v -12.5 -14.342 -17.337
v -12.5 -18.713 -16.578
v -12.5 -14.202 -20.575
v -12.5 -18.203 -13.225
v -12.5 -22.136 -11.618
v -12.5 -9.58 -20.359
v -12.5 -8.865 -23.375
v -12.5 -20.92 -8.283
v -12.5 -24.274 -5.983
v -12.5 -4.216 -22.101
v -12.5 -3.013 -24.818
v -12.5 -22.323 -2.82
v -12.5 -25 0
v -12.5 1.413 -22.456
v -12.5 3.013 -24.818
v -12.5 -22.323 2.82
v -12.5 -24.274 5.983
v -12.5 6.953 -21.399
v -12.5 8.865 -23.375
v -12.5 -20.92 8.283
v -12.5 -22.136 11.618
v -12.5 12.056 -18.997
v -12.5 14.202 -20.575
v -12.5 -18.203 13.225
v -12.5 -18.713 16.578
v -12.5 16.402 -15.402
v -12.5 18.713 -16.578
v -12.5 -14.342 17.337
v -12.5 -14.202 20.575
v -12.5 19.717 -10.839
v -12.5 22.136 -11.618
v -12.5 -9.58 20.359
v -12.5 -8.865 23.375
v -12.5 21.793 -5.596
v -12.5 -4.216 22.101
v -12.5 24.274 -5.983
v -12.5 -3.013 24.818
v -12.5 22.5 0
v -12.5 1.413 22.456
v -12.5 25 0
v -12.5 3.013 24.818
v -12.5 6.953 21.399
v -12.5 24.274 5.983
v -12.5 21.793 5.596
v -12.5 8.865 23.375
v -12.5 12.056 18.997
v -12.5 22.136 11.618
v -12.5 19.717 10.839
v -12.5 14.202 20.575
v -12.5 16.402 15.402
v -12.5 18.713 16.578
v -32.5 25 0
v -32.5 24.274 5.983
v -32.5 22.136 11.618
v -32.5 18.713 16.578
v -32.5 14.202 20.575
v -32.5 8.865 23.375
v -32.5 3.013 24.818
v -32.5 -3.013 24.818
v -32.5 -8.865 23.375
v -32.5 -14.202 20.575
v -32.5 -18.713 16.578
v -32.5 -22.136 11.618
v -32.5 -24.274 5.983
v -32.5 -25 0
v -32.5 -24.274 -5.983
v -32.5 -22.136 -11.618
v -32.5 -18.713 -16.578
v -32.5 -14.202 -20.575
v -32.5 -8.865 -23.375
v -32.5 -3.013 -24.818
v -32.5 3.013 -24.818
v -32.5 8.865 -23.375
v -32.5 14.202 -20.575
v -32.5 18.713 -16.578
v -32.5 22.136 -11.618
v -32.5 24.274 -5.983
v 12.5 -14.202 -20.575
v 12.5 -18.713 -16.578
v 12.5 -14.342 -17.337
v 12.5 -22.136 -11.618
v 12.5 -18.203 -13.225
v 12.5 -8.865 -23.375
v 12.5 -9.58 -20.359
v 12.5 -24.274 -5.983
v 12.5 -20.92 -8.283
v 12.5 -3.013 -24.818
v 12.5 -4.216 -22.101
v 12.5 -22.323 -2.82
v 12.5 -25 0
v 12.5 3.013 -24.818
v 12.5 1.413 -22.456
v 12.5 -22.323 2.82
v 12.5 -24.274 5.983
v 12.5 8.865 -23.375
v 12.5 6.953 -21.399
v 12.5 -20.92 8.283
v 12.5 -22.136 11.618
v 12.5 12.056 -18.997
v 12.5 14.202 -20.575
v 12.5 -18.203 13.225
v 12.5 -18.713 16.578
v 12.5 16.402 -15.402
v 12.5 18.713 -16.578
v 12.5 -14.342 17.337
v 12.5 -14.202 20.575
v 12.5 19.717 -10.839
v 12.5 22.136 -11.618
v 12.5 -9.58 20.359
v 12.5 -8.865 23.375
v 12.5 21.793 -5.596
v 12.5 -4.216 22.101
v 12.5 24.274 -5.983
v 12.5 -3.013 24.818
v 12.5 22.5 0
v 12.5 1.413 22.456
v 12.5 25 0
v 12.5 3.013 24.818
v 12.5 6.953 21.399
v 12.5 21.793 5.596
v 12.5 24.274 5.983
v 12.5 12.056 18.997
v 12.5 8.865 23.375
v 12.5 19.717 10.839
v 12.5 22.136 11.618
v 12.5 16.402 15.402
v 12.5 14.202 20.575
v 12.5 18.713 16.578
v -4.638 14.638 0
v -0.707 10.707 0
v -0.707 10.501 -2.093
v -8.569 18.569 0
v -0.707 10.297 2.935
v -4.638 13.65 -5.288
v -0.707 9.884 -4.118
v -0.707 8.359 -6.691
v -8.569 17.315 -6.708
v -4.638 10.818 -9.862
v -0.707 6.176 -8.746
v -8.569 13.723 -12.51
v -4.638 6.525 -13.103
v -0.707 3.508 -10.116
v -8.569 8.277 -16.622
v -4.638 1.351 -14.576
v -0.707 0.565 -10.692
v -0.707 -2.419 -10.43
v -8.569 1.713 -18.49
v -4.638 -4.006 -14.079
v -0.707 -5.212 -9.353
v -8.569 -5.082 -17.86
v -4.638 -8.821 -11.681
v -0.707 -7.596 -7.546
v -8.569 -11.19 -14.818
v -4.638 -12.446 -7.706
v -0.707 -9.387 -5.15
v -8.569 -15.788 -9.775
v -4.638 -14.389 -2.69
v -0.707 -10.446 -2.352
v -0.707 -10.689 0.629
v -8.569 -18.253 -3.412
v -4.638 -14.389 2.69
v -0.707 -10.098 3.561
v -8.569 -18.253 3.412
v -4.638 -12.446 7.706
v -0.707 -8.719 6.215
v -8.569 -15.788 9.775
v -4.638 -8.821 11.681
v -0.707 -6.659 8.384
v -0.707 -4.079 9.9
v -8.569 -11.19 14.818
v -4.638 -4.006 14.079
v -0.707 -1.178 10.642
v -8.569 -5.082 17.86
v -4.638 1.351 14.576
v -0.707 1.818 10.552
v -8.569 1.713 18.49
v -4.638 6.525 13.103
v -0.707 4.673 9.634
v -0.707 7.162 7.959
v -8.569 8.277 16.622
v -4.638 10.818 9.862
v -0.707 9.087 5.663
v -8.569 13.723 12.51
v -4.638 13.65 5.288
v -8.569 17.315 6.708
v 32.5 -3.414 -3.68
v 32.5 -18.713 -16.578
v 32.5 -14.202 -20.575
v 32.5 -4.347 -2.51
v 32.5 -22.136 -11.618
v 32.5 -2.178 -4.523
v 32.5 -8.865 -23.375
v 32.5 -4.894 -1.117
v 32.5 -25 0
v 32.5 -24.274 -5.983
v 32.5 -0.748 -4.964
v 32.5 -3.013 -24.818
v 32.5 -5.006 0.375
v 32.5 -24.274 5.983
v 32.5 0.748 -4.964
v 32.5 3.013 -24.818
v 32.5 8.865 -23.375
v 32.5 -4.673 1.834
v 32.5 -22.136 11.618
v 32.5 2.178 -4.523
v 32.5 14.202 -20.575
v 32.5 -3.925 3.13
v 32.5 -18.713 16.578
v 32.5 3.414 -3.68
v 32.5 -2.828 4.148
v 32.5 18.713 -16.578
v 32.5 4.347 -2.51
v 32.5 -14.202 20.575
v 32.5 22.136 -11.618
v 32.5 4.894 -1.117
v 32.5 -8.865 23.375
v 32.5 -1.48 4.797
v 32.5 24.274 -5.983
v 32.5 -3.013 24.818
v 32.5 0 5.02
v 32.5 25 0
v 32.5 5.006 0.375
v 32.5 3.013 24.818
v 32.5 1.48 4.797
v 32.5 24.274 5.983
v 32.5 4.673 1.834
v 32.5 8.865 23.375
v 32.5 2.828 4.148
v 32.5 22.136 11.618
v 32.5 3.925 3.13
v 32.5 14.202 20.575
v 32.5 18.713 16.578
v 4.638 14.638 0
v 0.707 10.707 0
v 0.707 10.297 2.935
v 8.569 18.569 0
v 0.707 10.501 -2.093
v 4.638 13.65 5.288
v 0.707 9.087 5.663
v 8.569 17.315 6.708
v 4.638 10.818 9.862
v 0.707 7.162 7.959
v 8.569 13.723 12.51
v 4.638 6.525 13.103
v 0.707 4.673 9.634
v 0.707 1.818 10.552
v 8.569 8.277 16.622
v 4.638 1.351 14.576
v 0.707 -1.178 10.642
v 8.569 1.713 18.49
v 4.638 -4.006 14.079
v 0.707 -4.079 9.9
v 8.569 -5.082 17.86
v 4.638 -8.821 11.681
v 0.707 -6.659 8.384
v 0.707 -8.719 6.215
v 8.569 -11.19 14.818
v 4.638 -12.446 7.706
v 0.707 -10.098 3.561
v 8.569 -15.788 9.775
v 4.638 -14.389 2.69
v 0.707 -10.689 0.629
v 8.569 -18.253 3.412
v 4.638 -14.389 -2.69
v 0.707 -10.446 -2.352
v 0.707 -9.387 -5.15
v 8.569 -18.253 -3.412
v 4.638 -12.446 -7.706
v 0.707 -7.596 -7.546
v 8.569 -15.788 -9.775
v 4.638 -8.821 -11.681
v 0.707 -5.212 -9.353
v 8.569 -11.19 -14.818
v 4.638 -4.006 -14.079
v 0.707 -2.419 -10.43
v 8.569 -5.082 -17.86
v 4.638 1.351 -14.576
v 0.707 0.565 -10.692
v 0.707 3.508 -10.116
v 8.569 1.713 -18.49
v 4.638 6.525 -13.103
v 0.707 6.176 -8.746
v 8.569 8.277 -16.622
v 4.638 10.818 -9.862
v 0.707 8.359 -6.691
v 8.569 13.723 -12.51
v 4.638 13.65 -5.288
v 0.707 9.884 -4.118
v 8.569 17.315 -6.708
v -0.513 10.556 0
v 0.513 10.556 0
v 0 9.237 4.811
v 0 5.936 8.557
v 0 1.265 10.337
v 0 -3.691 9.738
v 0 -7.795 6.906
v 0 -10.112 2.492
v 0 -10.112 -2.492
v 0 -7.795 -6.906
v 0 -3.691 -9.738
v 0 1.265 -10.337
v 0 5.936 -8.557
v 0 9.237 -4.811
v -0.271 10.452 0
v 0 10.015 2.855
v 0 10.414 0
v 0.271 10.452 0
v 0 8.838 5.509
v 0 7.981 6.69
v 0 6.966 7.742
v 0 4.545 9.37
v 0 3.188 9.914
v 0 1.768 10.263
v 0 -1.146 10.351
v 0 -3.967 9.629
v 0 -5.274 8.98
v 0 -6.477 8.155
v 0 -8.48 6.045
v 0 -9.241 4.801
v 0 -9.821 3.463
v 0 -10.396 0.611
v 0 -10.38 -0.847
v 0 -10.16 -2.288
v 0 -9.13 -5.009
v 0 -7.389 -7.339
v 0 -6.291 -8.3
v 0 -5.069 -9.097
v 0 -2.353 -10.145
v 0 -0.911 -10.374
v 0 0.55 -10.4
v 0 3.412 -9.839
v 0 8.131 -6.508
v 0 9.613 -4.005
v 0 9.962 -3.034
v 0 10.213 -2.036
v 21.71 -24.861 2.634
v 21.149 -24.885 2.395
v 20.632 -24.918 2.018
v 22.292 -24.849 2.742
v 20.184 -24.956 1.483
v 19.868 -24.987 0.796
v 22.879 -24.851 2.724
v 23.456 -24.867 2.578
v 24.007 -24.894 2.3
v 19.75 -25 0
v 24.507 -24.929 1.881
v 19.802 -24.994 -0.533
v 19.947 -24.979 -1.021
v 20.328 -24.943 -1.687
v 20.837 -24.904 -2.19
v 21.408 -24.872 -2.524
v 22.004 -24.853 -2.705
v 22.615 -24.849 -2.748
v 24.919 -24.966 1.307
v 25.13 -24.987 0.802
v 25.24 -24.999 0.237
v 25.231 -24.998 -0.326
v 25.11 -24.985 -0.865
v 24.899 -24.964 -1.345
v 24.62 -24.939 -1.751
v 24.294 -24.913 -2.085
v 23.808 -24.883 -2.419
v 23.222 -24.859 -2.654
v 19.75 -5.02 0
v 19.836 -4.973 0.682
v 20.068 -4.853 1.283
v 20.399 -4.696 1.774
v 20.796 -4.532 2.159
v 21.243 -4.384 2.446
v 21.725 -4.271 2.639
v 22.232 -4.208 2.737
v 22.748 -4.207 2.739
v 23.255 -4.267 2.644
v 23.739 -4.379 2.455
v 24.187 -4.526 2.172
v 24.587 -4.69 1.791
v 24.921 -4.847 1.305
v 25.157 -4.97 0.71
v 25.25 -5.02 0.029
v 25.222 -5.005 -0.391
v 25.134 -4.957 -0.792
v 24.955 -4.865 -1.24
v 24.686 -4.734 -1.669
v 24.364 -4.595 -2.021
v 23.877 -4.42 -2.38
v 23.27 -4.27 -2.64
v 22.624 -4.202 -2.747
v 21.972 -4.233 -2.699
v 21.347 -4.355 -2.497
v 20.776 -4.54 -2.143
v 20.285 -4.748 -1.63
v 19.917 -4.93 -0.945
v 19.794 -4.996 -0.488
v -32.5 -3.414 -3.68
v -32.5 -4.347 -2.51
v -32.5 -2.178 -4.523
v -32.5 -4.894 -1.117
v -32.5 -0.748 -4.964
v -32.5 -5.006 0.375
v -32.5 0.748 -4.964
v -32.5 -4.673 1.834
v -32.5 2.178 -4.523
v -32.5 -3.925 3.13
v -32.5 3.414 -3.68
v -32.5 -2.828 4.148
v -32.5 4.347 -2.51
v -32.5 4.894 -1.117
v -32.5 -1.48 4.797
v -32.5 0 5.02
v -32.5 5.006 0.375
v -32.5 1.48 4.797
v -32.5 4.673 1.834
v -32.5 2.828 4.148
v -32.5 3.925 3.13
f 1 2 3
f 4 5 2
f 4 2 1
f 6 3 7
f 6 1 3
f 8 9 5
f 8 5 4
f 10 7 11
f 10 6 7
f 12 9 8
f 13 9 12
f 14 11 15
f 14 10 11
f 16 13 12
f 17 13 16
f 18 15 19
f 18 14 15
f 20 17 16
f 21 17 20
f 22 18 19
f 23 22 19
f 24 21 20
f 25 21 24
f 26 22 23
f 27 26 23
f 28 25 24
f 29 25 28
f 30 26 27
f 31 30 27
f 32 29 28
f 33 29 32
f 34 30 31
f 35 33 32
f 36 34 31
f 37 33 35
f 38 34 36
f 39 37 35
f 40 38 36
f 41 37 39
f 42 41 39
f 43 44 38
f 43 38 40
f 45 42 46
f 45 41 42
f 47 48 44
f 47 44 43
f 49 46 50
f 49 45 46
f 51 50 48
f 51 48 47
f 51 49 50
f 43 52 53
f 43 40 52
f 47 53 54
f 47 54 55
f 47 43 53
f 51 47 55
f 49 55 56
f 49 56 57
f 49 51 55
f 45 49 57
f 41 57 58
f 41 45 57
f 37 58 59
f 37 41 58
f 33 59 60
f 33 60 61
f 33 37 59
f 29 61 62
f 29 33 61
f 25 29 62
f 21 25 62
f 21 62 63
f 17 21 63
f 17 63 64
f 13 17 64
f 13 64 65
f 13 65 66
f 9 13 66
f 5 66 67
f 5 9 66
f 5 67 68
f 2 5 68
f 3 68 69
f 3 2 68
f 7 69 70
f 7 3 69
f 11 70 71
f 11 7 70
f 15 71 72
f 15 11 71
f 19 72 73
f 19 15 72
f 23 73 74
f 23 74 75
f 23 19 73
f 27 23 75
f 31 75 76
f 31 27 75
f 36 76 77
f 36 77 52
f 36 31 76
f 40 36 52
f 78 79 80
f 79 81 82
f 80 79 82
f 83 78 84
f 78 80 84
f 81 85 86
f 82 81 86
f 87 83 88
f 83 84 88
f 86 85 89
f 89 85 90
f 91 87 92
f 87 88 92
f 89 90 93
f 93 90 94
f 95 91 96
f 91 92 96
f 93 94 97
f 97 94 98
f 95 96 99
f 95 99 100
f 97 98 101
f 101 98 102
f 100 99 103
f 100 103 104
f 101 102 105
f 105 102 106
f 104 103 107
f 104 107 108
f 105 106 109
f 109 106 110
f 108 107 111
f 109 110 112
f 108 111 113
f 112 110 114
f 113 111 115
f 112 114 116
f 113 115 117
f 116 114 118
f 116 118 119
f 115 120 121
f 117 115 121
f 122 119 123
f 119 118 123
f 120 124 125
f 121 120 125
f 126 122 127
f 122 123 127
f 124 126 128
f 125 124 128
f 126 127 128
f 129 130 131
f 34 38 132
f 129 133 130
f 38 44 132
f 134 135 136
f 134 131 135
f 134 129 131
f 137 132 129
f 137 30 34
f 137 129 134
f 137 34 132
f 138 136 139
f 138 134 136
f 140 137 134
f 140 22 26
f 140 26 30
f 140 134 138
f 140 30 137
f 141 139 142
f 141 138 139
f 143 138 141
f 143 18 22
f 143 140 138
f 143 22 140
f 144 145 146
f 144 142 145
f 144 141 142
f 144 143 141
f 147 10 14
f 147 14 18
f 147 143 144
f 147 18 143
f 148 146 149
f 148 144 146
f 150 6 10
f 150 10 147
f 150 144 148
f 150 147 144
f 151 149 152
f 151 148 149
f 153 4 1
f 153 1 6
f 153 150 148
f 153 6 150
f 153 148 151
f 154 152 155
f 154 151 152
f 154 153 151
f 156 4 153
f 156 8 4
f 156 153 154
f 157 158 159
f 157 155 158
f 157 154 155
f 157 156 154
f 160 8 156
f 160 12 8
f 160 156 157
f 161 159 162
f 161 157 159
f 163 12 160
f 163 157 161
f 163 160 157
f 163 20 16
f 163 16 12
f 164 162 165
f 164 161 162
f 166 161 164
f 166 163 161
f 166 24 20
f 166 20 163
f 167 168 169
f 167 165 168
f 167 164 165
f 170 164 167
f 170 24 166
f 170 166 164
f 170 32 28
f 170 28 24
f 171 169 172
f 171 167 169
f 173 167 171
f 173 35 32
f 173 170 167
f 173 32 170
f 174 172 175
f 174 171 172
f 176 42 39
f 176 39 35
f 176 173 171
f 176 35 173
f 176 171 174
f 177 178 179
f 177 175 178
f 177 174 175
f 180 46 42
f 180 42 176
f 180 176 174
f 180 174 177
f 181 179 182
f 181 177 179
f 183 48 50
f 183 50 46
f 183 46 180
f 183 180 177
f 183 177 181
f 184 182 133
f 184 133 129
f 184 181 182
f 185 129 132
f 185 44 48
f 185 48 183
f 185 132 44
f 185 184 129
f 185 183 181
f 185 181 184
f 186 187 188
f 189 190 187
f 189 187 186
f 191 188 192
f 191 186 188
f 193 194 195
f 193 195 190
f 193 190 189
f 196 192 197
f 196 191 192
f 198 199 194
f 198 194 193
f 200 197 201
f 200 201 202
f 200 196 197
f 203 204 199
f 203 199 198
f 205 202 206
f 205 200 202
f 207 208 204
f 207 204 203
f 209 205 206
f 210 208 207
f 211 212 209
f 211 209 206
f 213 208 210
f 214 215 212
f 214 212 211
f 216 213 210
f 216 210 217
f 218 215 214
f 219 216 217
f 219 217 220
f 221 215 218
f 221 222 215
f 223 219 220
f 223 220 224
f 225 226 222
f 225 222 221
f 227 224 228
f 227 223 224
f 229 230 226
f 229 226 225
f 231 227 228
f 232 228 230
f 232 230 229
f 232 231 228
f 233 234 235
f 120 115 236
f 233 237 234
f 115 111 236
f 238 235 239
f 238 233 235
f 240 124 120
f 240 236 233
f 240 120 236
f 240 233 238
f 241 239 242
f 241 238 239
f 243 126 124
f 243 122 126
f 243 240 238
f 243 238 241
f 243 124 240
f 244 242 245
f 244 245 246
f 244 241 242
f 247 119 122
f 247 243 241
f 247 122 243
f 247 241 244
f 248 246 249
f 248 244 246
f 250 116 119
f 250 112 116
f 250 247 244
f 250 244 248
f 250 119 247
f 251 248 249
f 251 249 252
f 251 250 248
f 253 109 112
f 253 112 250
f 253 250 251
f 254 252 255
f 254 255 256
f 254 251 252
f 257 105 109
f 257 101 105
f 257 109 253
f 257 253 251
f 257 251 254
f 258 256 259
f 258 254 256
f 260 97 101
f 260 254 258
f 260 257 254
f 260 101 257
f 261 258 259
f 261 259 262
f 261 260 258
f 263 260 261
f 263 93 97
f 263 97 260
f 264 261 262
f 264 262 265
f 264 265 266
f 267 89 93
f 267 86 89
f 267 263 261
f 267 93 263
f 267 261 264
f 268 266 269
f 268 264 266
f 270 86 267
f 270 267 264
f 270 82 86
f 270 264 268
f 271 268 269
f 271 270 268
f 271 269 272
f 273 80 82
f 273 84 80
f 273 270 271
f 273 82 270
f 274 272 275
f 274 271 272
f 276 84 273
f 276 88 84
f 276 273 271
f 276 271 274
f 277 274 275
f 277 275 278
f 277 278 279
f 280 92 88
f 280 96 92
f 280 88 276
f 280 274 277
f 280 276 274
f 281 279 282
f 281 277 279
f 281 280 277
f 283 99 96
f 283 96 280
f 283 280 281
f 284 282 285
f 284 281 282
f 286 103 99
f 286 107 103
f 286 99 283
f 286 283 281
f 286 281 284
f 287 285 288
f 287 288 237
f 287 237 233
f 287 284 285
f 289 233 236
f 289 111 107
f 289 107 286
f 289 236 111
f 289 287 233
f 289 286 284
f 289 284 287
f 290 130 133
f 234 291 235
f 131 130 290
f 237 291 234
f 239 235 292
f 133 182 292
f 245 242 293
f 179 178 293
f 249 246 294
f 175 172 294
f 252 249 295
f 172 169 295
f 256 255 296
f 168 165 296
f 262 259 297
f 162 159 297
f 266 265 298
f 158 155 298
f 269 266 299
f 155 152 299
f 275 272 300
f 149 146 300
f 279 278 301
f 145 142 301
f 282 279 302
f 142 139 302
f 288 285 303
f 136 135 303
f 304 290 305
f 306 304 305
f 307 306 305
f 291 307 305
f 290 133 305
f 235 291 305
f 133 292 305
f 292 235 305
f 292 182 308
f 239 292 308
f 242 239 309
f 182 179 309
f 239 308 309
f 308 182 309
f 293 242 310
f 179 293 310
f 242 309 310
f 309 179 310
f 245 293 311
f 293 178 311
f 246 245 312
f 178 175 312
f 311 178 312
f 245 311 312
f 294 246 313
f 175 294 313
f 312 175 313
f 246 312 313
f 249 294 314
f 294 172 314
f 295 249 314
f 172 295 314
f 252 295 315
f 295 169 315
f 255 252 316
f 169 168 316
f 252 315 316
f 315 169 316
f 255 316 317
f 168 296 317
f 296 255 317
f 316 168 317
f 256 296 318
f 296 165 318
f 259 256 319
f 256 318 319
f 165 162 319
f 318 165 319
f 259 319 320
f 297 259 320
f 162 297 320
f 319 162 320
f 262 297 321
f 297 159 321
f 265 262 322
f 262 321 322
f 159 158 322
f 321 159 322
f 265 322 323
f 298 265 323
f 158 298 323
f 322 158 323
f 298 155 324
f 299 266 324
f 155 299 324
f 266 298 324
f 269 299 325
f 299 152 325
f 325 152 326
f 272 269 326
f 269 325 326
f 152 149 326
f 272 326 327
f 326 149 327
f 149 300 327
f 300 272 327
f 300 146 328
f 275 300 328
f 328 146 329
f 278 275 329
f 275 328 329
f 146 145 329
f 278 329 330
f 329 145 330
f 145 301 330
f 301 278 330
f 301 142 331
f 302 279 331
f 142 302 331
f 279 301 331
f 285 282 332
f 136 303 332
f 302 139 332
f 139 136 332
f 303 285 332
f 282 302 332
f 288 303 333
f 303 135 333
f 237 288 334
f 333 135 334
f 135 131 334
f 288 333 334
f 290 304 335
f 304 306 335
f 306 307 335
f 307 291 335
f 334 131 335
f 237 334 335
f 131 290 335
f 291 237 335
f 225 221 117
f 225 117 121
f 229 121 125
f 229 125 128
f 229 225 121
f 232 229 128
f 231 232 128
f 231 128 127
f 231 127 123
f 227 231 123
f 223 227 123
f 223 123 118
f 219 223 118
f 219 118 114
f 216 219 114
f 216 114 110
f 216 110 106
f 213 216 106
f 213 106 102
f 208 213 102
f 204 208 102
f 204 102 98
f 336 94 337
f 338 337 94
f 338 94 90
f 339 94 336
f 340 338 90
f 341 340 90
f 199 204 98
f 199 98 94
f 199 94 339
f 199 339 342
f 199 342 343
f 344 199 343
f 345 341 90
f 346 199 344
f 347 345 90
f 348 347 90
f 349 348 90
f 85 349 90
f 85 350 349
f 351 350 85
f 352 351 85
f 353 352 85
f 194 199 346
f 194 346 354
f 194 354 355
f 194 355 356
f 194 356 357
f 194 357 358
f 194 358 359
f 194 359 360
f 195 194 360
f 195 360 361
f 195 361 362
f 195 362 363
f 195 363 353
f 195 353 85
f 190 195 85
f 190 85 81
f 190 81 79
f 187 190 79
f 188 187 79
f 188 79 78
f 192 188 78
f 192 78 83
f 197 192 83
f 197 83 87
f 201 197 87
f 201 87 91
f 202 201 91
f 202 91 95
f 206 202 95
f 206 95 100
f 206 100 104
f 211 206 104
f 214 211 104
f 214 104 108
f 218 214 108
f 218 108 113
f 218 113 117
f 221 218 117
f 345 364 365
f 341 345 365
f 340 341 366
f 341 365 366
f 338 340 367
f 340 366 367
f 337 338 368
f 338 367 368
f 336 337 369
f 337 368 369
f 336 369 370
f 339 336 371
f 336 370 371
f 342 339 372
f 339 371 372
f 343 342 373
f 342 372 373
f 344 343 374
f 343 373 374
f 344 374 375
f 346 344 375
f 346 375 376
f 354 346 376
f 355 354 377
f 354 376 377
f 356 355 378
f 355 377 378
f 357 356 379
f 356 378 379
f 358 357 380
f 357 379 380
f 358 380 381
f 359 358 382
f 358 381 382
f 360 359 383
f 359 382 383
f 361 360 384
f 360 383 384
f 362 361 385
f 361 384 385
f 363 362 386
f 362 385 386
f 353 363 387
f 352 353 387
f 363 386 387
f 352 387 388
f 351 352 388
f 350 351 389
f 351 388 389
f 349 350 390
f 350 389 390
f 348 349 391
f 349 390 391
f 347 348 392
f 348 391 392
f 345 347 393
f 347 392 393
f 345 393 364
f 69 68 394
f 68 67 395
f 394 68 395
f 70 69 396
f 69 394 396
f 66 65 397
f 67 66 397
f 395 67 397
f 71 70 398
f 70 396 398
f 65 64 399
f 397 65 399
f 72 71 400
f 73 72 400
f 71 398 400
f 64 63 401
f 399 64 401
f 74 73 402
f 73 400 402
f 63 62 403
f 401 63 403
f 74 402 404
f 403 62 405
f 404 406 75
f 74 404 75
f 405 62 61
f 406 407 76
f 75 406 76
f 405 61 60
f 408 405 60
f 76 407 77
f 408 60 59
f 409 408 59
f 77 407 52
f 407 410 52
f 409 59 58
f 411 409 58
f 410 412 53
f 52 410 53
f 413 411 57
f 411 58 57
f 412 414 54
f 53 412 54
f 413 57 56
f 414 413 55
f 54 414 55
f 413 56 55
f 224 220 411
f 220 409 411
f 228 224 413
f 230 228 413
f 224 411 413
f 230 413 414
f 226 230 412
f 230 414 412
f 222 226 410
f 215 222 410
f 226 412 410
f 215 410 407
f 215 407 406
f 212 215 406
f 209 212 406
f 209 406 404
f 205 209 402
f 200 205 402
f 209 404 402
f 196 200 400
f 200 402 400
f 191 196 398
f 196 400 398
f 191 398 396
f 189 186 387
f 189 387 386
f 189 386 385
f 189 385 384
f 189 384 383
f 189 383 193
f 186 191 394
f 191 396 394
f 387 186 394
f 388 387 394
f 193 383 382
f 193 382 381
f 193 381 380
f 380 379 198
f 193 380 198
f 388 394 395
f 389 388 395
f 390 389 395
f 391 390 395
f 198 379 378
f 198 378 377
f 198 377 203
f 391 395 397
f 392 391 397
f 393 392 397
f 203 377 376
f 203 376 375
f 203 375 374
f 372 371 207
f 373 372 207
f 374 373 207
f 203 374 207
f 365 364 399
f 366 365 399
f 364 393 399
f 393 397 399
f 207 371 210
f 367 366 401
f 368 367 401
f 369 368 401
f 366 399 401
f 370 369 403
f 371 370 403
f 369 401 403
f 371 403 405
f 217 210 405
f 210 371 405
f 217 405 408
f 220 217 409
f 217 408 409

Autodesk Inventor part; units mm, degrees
ref_plane "YZ Plane" through (0, 0, 0) normal (1, 0, 0) x (0, 1, 0)
ref_plane "XZ Plane" through (0, 0, 0) normal (0, 1, 0) x (-1, 0, 0)
ref_plane "XY Plane" through (0, 0, 0) normal (0, 0, 1) x (1, 0, 0)
sketch "Sketch2" plane through (0, 0, 0) normal (0, 0, 1) x (1, 0, 0)
  line L0 (0, 0) -> (-32.5, 0)
  line L1 (-32.5, 0) -> (-32.5, 25)
  line L2 (-32.5, 25) -> (-12.5, 25)
  line L3 (-12.5, 25) -> (-12.5, 22.5)
  line L4 (-12.5, 22.5) -> (12.5, 22.5)
  line L5 (12.5, 22.5) -> (12.5, 25)
  line L6 (12.5, 25) -> (32.5, 25)
  line L7 (32.5, 25) -> (32.5, 0)
  line L8 (32.5, 0) -> (0, 0)
  line L9 (-12.5, 22.5) -> (0, 10)
  line L10 (0, 10) -> (12.5, 22.5)
  line L11 (-45.5, 0) -> (45.5, 0) projected
  point P0 (0, 22.5)
  dimension "d1" = 20
  dimension "d2" = 65
  dimension "d4" = 25
  dimension "d5" = 45
  dimension "d6" = 45
  dimension "d7" = 5
revolve "Revolution1" add sketch "Sketch2" angle 360 about axis through (-10, 0, 0) along (1, 0, 0) contours L0 L1 L2 L3 L9 L10 L5 L6 L7 L8
fillet "Fillet1" radius 1 1 edges at (0, -10, 0)
sketch "Sketch3" plane through (-32.5, 0, 0) normal (-1, 0, 0) x (0, 0, 1)
  circle A0 centre (0, 0) radius 5.02
  dimension "d10" = 10.04
extrude "Extrusion1" cut sketch "Sketch3" against normal through all
sketch "Sketch5" plane through (0, 0, 0) normal (0, 1, 0) x (-1, 0, 0)
  line L0 (-32.5, 25) -> (-32.5, -25) projected
  line L1 (-32.5, 0) -> (32.6883, 0)
  line L2 (-12.5, 25) -> (-32.5, 25) projected
  line L3 (-22.5, 25) -> (-22.5, -25)
  line L4 (-12.5, -25) -> (-32.5, -25) projected
  line L5 (32.5, 25) -> (12.5, 25) projected
  line L6 (22.5, 25) -> (22.5, -25)
  line L7 (32.5, -25) -> (12.5, -25) projected
  circle A0 centre (-22.5, 0) radius 2.75
  point P0 (0, 0)
  dimension "d13" = 5.5
extrude "Extrusion2" cut sketch "Sketch5" against normal through all contours A0 L3 L1 | L1 L3 A0 | A0 L1 L3 | L1 A0 L3
properties part number "guideWheel"
